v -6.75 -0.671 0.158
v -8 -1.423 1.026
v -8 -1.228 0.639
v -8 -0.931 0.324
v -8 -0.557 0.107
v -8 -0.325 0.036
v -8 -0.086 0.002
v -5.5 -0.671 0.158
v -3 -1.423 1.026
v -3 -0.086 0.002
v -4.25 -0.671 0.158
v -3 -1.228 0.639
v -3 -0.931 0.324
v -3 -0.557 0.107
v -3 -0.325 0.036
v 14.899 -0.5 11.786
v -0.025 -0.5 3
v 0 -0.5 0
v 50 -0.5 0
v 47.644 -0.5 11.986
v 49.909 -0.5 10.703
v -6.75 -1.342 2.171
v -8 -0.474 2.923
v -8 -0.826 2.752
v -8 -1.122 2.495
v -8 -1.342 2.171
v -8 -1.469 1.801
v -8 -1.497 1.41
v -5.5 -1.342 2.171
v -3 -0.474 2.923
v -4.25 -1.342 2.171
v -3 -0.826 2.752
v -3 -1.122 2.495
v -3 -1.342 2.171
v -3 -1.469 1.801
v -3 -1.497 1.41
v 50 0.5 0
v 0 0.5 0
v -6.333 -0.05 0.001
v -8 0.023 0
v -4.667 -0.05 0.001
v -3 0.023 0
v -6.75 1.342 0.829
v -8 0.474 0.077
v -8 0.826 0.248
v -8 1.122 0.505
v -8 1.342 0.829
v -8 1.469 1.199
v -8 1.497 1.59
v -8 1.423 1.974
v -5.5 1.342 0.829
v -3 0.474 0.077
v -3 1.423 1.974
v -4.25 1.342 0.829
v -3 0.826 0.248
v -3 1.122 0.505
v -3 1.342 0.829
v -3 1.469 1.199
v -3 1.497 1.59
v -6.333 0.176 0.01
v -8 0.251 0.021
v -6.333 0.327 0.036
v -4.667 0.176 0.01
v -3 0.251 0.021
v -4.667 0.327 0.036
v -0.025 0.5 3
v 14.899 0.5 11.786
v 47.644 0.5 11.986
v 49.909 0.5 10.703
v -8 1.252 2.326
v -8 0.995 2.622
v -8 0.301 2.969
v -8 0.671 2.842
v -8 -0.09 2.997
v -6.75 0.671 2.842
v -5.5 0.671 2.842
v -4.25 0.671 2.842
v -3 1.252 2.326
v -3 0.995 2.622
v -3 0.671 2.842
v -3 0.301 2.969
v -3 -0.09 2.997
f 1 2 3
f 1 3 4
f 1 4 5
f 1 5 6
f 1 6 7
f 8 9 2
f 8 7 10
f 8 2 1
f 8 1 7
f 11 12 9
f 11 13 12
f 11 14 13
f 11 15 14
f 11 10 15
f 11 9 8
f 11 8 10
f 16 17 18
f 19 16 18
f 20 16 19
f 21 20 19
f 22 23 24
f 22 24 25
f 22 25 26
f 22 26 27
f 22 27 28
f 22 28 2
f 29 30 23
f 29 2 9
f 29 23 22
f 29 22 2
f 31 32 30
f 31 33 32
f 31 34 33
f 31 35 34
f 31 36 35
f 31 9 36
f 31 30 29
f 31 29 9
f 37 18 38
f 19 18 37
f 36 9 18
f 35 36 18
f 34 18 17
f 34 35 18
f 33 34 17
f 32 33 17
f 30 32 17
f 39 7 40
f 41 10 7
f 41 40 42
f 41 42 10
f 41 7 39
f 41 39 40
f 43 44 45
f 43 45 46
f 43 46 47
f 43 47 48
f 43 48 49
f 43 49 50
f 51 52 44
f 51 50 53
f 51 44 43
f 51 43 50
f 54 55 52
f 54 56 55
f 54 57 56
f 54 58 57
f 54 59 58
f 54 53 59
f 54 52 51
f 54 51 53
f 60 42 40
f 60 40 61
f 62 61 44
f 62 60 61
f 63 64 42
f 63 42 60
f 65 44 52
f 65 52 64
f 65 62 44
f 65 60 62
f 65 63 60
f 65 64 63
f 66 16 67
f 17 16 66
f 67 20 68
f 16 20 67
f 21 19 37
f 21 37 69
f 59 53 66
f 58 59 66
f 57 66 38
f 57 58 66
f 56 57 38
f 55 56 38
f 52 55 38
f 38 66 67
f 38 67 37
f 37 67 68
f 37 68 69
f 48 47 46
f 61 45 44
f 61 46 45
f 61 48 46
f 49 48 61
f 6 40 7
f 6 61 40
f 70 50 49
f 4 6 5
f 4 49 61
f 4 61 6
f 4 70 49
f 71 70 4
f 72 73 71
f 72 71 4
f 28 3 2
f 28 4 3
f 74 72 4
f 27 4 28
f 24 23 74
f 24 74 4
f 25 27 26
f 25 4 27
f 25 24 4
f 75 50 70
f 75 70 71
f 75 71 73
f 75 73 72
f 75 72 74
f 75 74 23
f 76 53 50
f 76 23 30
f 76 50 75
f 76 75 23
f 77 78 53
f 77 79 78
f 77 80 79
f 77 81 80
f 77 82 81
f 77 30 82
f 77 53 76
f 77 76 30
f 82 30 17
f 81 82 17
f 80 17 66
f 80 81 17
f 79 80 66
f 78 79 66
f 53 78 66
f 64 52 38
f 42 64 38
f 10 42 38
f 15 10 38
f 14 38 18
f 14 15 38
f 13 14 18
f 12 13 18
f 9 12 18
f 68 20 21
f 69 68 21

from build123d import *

# Parameters (mm, degrees)
F1_DEPTH  = 0.5
F1_FACE_W = 1
F1_FACE_H = 3
F6_DEPTH  = 5
F8_DEPTH  = 25


# Not quite as in the source:
# - the arcs of a loft's sections are written as splines that run evenly, so that the points pair up as in the source's solid


with BuildPart() as f1:
    # F0 (on Front) → F1 (new body, symmetric)
    with BuildSketch(Plane.XZ):
        Polygon((-0.0253911159, 2.9998925466), (0, 0), (50, 0), (49.8984355364, 11.9995701865), (14.899088368, 11.7857997863), align=None)
    extrude(amount=F1_DEPTH, both=True)

    # F1_face (on face) → F4 section 0
    with BuildSketch(Plane(origin=(-0.0126955579, 0, 1.4999462733), x_dir=(0, -1, 0), z_dir=(-0.9999641822, 0, -0.0084637053))):
        Rectangle(F1_FACE_W, F1_FACE_H)
    # F3 (on offset) → F4 section 1
    with BuildSketch(Plane.YZ.offset(-3)):
        with BuildLine():
            add(Edge.make_bspline(
                [(-0.4743722327, 2.9230147522), (-0.6606444281, 2.8609195721), (-0.834496694, 2.7618115588), (-1.1311572384, 2.5045080607), (-1.2538487938, 2.3464138139), (-1.4294616132, 1.995169303), (-1.482313781, 1.8021572386), (-1.5101434154, 1.4104455076), (-1.4851099322, 1.2118999628), (-1.4230147522, 1.0256277673)],
                knots=[0, 0, 0, 0, 0.25, 0.25, 0.5, 0.5, 0.75, 0.75, 1, 1, 1, 1], degree=3))
            add(Edge.make_bspline(
                [(-1.4230147522, 1.0256277673), (-1.3609195721, 0.8393555719), (-1.2618115588, 0.665503306), (-1.0045080607, 0.3688427616), (-0.8464138139, 0.2461512062), (-0.495169303, 0.0705383868), (-0.3021572386, 0.017686219), (0.0895544924, -0.0101434154), (0.2881000372, 0.0148900678), (0.4743722327, 0.0769852478)],
                knots=[0, 0, 0, 0, 0.25, 0.25, 0.5, 0.5, 0.75, 0.75, 1, 1, 1, 1], degree=3))
            add(Edge.make_bspline(
                [(0.4743722327, 0.0769852478), (0.6606444281, 0.1390804279), (0.834496694, 0.2381884412), (1.1311572384, 0.4954919393), (1.2538487938, 0.6535861861), (1.4294616132, 1.004830697), (1.482313781, 1.1978427614), (1.5101434154, 1.5895544924), (1.4851099322, 1.7881000372), (1.4230147522, 1.9743722327)],
                knots=[0, 0, 0, 0, 0.25, 0.25, 0.5, 0.5, 0.75, 0.75, 1, 1, 1, 1], degree=3))
            add(Edge.make_bspline(
                [(1.4230147522, 1.9743722327), (1.3609195721, 2.1606444281), (1.2618115588, 2.334496694), (1.0045080607, 2.6311572384), (0.8464138139, 2.7538487938), (0.495169303, 2.9294616132), (0.3021572386, 2.982313781), (-0.0895544924, 3.0101434154), (-0.2881000372, 2.9851099322), (-0.4743722327, 2.9230147522)],
                knots=[0, 0, 0, 0, 0.25, 0.25, 0.5, 0.5, 0.75, 0.75, 1, 1, 1, 1], degree=3))
        make_face()
    loft(ruled=True)

    # F5 (on face) → F6 (join)
    with BuildSketch(Plane(origin=(-3, 0, 0), x_dir=(0, -1, 0), z_dir=(-1, 0, 0))):
        with BuildLine():
            add(Edge.make_bspline(
                [(0.2236067977, 0.9472135955), (0.2049485822, 0.9590404276), (0.165567887, 0.9783654777), (0.1016629971, 0.9971413164), (0.0354857267, 0.9971906029), (-0.0298581595, 1.006417373), (-0.0962378171, 0.9979647462), (-0.1574135127, 0.9730184068), (-0.2213803356, 0.9564199077), (-0.2794920021, 0.9232440711), (-0.3264257064, 0.8766967879), (-0.3795448144, 0.8369923373), (-0.419371865, 0.7835849556), (-0.4393276132, 0.744366395), (-0.4472135955, 0.7236067977)],
                knots=[0, 0, 0, 0, 0.0661130278, 0.1311431351, 0.1976238463, 0.263561262, 0.3285913694, 0.3952621183, 0.461199534, 0.5262296414, 0.5929003903, 0.6590289395, 0.7240590469, 0.7905532518, 0.7905532518, 0.7905532518, 0.7905532518], degree=3))
            add(Edge.make_bspline(
                [(-0.4472135955, 0.7236067977), (-0.4590404276, 0.7049485822), (-0.4783654777, 0.665567887), (-0.4971413164, 0.6016629971), (-0.4971906029, 0.5354857267), (-0.506417373, 0.4701418405), (-0.4979647462, 0.4037621829), (-0.4730184068, 0.3425864873), (-0.4564199077, 0.2786196644), (-0.4232440711, 0.2205079979), (-0.3766967879, 0.1735742936), (-0.3369923373, 0.1204551856), (-0.2835849556, 0.080628135), (-0.244366395, 0.0606723868), (-0.2236067977, 0.0527864045)],
                knots=[0, 0, 0, 0, 0.0661130278, 0.1311431351, 0.1976238463, 0.263561262, 0.3285913694, 0.3952621183, 0.461199534, 0.5262296414, 0.5929003903, 0.6590289395, 0.7240590469, 0.7905532518, 0.7905532518, 0.7905532518, 0.7905532518], degree=3))
            add(Edge.make_bspline(
                [(-0.2236067977, 0.0527864045), (-0.2049485822, 0.0409595724), (-0.165567887, 0.0216345223), (-0.1016629971, 0.0028586836), (-0.0533041533, 0.0028226676), (-0.0269411852, 0.0005980705), (-0.0226951286, 0.0002149422)],
                knots=[0, 0, 0, 0, 0.0661130278, 0.1311431351, 0.1976238463, 0.2103977386, 0.2103977386, 0.2103977386, 0.2103977386], degree=3))
            add(Edge.make_bspline(
                [(0.0857219406, 0.0024530962), (0.0496252148, 0.0003925316), (0.0134550487, -0.000349593), (-0.0226951286, 0.0002149422)],
                knots=[0.7587522631, 0.7587522631, 0.7587522631, 0.7587522631, 0.8047879331, 0.8047879331, 0.8047879331, 0.8047879331], degree=3))
            add(Edge.make_bspline(
                [(0.0857219406, 0.0024530962), (0.0887772594, 0.0031276832), (0.1134683814, 0.0090615655), (0.1574135127, 0.0269815932), (0.2213803356, 0.0435800923), (0.2794920021, 0.0767559289), (0.3264257064, 0.1233032121), (0.3795448144, 0.1630076627), (0.419371865, 0.2164150444), (0.4393276132, 0.255633605), (0.4472135955, 0.2763932023)],
                knots=[0.3192274693, 0.3192274693, 0.3192274693, 0.3192274693, 0.3285913694, 0.3952621183, 0.461199534, 0.5262296414, 0.5929003903, 0.6590289395, 0.7240590469, 0.7905532518, 0.7905532518, 0.7905532518, 0.7905532518], degree=3))
            add(Edge.make_bspline(
                [(0.4472135955, 0.2763932023), (0.4590404276, 0.2950514178), (0.4783654777, 0.334432113), (0.4971413164, 0.3983370029), (0.4971906029, 0.4645142733), (0.506417373, 0.5298581595), (0.4979647462, 0.5962378171), (0.4730184068, 0.6574135127), (0.4564199077, 0.7213803356), (0.4232440711, 0.7794920021), (0.3766967879, 0.8264257064), (0.3369923373, 0.8795448144), (0.2835849556, 0.919371865), (0.244366395, 0.9393276132), (0.2236067977, 0.9472135955)],
                knots=[0, 0, 0, 0, 0.0661130278, 0.1311431351, 0.1976238463, 0.263561262, 0.3285913694, 0.3952621183, 0.461199534, 0.5262296414, 0.5929003903, 0.6590289395, 0.7240590469, 0.7905532518, 0.7905532518, 0.7905532518, 0.7905532518], degree=3))
        make_face()
        with BuildLine():
            add(Edge.make_bspline(
                [(-0.4472135955, 0.7236067977), (-0.4590404276, 0.7049485822), (-0.4783654777, 0.665567887), (-0.4971413164, 0.6016629971), (-0.4971906029, 0.5354857267), (-0.506417373, 0.4701418405), (-0.4979647462, 0.4037621829), (-0.4730184068, 0.3425864873), (-0.4564199077, 0.2786196644), (-0.4232440711, 0.2205079979), (-0.3766967879, 0.1735742936), (-0.3369923373, 0.1204551856), (-0.2835849556, 0.080628135), (-0.244366395, 0.0606723868), (-0.2236067977, 0.0527864045)],
                knots=[0, 0, 0, 0, 0.0661130278, 0.1311431351, 0.1976238463, 0.263561262, 0.3285913694, 0.3952621183, 0.461199534, 0.5262296414, 0.5929003903, 0.6590289395, 0.7240590469, 0.7905532518, 0.7905532518, 0.7905532518, 0.7905532518], degree=3))
            add(Edge.make_bspline(
                [(0.2236067977, 0.9472135955), (0.2049485822, 0.9590404276), (0.165567887, 0.9783654777), (0.1016629971, 0.9971413164), (0.0354857267, 0.9971906029), (-0.0298581595, 1.006417373), (-0.0962378171, 0.9979647462), (-0.1574135127, 0.9730184068), (-0.2213803356, 0.9564199077), (-0.2794920021, 0.9232440711), (-0.3264257064, 0.8766967879), (-0.3795448144, 0.8369923373), (-0.419371865, 0.7835849556), (-0.4393276132, 0.744366395), (-0.4472135955, 0.7236067977)],
                knots=[0, 0, 0, 0, 0.0661130278, 0.1311431351, 0.1976238463, 0.263561262, 0.3285913694, 0.3952621183, 0.461199534, 0.5262296414, 0.5929003903, 0.6590289395, 0.7240590469, 0.7905532518, 0.7905532518, 0.7905532518, 0.7905532518], degree=3))
            add(Edge.make_bspline(
                [(0.4472135955, 0.2763932023), (0.4590404276, 0.2950514178), (0.4783654777, 0.334432113), (0.4971413164, 0.3983370029), (0.4971906029, 0.4645142733), (0.506417373, 0.5298581595), (0.4979647462, 0.5962378171), (0.4730184068, 0.6574135127), (0.4564199077, 0.7213803356), (0.4232440711, 0.7794920021), (0.3766967879, 0.8264257064), (0.3369923373, 0.8795448144), (0.2835849556, 0.919371865), (0.244366395, 0.9393276132), (0.2236067977, 0.9472135955)],
                knots=[0, 0, 0, 0, 0.0661130278, 0.1311431351, 0.1976238463, 0.263561262, 0.3285913694, 0.3952621183, 0.461199534, 0.5262296414, 0.5929003903, 0.6590289395, 0.7240590469, 0.7905532518, 0.7905532518, 0.7905532518, 0.7905532518], degree=3))
            add(Edge.make_bspline(
                [(0.0857219406, 0.0024530962), (0.0887772594, 0.0031276832), (0.1134683814, 0.0090615655), (0.1574135127, 0.0269815932), (0.2213803356, 0.0435800923), (0.2794920021, 0.0767559289), (0.3264257064, 0.1233032121), (0.3795448144, 0.1630076627), (0.419371865, 0.2164150444), (0.4393276132, 0.255633605), (0.4472135955, 0.2763932023)],
                knots=[0.3192274693, 0.3192274693, 0.3192274693, 0.3192274693, 0.3285913694, 0.3952621183, 0.461199534, 0.5262296414, 0.5929003903, 0.6590289395, 0.7240590469, 0.7905532518, 0.7905532518, 0.7905532518, 0.7905532518], degree=3))
            add(Edge.make_bspline(
                [(1.4230147522, 1.0256277673), (1.3609195721, 0.8393555719), (1.2618115588, 0.665503306), (1.0045080607, 0.3688427616), (0.8464138139, 0.2461512062), (0.495169303, 0.0705383868), (0.3021572386, 0.017686219), (0.0994446448, 0.0032842572), (0.09258462, 0.002844849), (0.0857219406, 0.0024530962)],
                knots=[0, 0, 0, 0, 0.25, 0.25, 0.5, 0.5, 0.75, 0.75, 0.7587522631, 0.7587522631, 0.7587522631, 0.7587522631], degree=3))
            add(Edge.make_bspline(
                [(0.4743722327, 2.9230147522), (0.6606444281, 2.8609195721), (0.834496694, 2.7618115588), (1.1311572384, 2.5045080607), (1.2538487938, 2.3464138139), (1.4294616132, 1.995169303), (1.482313781, 1.8021572386), (1.5101434154, 1.4104455076), (1.4851099322, 1.2118999628), (1.4230147522, 1.0256277673)],
                knots=[0, 0, 0, 0, 0.25, 0.25, 0.5, 0.5, 0.75, 0.75, 1, 1, 1, 1], degree=3))
            add(Edge.make_bspline(
                [(-1.4230147522, 1.9743722327), (-1.3609195721, 2.1606444281), (-1.2618115588, 2.334496694), (-1.0045080607, 2.6311572384), (-0.8464138139, 2.7538487938), (-0.495169303, 2.9294616132), (-0.3021572386, 2.982313781), (0.0895544924, 3.0101434154), (0.2881000372, 2.9851099322), (0.4743722327, 2.9230147522)],
                knots=[0, 0, 0, 0, 0.25, 0.25, 0.5, 0.5, 0.75, 0.75, 1, 1, 1, 1], degree=3))
            add(Edge.make_bspline(
                [(-0.4743722327, 0.0769852478), (-0.6606444281, 0.1390804279), (-0.834496694, 0.2381884412), (-1.1311572384, 0.4954919393), (-1.2538487938, 0.6535861861), (-1.4294616132, 1.004830697), (-1.482313781, 1.1978427614), (-1.5101434154, 1.5895544924), (-1.4851099322, 1.7881000372), (-1.4230147522, 1.9743722327)],
                knots=[0, 0, 0, 0, 0.25, 0.25, 0.5, 0.5, 0.75, 0.75, 1, 1, 1, 1], degree=3))
            add(Edge.make_bspline(
                [(-0.0226951286, 0.0002149422), (-0.1759882345, 0.002608827), (-0.3289219115, 0.0284983341), (-0.4743722327, 0.0769852478)],
                knots=[0.8047879331, 0.8047879331, 0.8047879331, 0.8047879331, 1, 1, 1, 1], degree=3))
            add(Edge.make_bspline(
                [(-0.2236067977, 0.0527864045), (-0.2049485822, 0.0409595724), (-0.165567887, 0.0216345223), (-0.1016629971, 0.0028586836), (-0.0533041533, 0.0028226676), (-0.0269411852, 0.0005980705), (-0.0226951286, 0.0002149422)],
                knots=[0, 0, 0, 0, 0.0661130278, 0.1311431351, 0.1976238463, 0.2103977386, 0.2103977386, 0.2103977386, 0.2103977386], degree=3))
        make_face()
    extrude(amount=F6_DEPTH)

    # F7 (on face) → F8 (cut)
    with BuildSketch(Plane.XZ.offset(0.5)):
        Polygon((49.8984355364, 11.9995701865), (47.6442072011, 11.9858017213), (49.9094060968, 10.7034277653), align=None)
    extrude(amount=-F8_DEPTH, mode=Mode.SUBTRACT)


solid = f1.part
